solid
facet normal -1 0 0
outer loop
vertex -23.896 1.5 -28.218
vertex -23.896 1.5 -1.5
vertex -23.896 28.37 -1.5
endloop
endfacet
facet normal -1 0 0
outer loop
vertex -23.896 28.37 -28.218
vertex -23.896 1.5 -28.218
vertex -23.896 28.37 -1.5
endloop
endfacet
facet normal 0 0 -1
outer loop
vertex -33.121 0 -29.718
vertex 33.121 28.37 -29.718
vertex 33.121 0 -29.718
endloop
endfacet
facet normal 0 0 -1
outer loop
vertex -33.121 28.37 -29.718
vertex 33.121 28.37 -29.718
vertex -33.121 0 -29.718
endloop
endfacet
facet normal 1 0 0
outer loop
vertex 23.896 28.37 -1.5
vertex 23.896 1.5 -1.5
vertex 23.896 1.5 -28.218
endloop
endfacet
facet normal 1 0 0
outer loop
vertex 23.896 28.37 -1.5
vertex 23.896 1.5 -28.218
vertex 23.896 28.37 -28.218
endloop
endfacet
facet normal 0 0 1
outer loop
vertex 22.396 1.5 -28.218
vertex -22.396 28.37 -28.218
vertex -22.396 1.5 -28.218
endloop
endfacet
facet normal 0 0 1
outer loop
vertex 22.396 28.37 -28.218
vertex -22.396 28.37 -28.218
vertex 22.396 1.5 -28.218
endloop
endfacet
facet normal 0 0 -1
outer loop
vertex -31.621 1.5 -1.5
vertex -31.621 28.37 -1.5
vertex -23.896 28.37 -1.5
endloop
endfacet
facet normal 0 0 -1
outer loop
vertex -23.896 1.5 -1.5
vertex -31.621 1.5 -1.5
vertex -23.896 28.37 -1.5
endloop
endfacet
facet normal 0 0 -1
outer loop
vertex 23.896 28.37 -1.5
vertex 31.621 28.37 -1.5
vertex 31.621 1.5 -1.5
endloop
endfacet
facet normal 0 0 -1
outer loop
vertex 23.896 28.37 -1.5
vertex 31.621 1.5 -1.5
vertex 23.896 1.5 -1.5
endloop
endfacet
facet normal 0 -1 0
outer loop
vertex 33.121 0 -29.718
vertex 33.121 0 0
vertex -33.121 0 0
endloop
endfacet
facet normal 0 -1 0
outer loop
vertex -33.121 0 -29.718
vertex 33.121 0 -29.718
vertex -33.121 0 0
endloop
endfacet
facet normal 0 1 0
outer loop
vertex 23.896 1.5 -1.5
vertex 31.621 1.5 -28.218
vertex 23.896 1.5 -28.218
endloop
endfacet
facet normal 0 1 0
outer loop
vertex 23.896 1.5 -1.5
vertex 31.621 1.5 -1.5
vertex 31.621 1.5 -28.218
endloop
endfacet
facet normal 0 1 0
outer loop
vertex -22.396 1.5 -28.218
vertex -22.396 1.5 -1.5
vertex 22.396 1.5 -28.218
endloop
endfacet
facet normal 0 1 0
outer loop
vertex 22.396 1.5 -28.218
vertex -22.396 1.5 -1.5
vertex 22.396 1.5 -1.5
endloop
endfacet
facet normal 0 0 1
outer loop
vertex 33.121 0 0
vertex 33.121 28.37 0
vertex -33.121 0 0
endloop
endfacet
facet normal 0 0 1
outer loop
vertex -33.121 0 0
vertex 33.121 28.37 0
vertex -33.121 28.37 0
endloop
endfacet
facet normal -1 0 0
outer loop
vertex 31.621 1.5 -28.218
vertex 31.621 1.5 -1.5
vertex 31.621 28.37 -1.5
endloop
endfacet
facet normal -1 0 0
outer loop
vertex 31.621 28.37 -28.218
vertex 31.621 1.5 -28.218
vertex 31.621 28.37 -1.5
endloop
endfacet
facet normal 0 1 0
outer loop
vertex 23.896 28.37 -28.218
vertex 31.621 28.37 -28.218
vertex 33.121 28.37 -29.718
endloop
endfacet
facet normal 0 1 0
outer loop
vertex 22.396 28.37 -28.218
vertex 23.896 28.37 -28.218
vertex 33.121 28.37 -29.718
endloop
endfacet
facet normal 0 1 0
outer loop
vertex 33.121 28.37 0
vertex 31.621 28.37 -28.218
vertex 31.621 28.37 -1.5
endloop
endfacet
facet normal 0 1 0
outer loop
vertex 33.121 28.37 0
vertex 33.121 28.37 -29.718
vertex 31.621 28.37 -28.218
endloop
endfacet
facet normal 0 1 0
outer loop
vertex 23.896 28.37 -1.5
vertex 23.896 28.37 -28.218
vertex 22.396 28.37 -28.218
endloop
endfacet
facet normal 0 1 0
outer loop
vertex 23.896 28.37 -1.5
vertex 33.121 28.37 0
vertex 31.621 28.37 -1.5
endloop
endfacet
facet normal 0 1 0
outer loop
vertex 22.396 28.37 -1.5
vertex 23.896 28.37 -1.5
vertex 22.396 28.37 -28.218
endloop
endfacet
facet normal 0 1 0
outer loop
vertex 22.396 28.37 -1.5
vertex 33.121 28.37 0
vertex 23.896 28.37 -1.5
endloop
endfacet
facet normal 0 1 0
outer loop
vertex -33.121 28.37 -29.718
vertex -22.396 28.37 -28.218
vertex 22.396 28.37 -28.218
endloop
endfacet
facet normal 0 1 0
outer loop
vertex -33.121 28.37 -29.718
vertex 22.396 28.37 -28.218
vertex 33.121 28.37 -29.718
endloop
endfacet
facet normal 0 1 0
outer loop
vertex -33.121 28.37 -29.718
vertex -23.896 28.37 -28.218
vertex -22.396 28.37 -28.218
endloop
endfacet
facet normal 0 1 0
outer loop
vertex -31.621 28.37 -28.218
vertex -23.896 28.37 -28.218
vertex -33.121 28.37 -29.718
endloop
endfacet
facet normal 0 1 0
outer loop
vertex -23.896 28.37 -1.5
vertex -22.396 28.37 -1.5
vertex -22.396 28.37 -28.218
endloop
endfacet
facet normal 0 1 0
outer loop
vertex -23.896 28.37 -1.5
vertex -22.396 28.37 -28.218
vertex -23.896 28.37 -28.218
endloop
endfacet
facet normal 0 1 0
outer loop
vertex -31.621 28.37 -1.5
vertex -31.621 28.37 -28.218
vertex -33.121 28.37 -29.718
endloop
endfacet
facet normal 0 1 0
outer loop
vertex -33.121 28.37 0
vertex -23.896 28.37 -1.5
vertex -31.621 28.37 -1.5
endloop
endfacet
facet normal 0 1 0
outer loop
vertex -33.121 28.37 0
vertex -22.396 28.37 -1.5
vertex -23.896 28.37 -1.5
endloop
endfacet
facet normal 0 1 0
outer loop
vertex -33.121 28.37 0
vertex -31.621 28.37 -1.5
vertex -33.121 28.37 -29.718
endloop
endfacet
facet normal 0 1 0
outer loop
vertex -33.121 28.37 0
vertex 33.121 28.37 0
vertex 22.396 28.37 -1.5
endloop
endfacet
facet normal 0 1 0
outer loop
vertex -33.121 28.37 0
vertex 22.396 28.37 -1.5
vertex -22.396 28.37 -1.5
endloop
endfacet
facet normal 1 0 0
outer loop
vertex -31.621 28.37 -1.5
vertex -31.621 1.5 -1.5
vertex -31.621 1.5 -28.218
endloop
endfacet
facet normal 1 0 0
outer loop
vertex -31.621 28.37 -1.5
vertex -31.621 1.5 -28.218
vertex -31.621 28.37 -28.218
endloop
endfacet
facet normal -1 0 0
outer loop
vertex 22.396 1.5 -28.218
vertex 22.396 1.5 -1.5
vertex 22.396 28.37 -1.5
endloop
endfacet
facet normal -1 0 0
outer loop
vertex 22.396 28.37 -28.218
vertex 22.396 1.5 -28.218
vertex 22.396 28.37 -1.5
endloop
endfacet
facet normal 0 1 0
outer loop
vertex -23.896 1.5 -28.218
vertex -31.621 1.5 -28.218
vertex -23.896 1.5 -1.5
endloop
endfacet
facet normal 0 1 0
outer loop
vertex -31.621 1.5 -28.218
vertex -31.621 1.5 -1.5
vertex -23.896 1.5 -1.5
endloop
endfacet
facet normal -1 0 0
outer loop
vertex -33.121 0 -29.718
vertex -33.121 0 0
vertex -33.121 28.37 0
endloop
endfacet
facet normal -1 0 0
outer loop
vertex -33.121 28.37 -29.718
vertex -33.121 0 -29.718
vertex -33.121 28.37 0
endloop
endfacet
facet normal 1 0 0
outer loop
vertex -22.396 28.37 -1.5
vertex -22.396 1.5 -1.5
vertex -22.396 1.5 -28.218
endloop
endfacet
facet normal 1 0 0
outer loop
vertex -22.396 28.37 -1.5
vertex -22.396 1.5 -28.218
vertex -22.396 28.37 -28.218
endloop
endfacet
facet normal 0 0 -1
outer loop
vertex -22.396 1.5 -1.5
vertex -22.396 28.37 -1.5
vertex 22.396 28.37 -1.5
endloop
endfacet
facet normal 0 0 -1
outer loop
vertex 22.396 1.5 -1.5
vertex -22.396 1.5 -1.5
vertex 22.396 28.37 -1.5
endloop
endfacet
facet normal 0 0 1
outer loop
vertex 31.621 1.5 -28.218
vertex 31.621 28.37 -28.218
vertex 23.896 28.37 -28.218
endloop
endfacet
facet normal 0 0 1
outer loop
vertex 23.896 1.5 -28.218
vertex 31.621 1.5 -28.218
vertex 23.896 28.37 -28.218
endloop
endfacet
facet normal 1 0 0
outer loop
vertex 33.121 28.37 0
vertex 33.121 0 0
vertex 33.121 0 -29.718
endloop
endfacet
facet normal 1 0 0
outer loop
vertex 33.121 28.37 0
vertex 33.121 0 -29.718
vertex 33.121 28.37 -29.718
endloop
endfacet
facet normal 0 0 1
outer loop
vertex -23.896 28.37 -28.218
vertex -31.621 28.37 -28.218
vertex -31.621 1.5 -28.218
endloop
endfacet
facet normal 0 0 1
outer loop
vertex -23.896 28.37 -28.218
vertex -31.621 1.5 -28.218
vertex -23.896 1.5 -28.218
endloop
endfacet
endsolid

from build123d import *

# Parameters (mm, degrees)
F0_W     = 57.017289
F0_H     = 28.369613
F1_DEPTH = 29.718
F2_T     = -1.5


with BuildPart() as f1:
    # F0 (on Top) → F1 (new body)
    with BuildSketch(Plane.XY):
        with Locations((-4.612352, 14.184806)):
            Rectangle(F0_W, F0_H)
    extrude(amount=-F1_DEPTH)

    # F2
    f2_openings = [f1.faces().sort_by_distance(p)[0] for p in [
        (-4.612353, 28.369613, -14.859),
    ]]
    offset(amount=F2_T, openings=f2_openings)

    # F3: F1 across plane


with BuildPart() as f1_1:
    add(f1.part)
    add(f1.part.mirror(Plane.YZ))


solid = f1_1.part
